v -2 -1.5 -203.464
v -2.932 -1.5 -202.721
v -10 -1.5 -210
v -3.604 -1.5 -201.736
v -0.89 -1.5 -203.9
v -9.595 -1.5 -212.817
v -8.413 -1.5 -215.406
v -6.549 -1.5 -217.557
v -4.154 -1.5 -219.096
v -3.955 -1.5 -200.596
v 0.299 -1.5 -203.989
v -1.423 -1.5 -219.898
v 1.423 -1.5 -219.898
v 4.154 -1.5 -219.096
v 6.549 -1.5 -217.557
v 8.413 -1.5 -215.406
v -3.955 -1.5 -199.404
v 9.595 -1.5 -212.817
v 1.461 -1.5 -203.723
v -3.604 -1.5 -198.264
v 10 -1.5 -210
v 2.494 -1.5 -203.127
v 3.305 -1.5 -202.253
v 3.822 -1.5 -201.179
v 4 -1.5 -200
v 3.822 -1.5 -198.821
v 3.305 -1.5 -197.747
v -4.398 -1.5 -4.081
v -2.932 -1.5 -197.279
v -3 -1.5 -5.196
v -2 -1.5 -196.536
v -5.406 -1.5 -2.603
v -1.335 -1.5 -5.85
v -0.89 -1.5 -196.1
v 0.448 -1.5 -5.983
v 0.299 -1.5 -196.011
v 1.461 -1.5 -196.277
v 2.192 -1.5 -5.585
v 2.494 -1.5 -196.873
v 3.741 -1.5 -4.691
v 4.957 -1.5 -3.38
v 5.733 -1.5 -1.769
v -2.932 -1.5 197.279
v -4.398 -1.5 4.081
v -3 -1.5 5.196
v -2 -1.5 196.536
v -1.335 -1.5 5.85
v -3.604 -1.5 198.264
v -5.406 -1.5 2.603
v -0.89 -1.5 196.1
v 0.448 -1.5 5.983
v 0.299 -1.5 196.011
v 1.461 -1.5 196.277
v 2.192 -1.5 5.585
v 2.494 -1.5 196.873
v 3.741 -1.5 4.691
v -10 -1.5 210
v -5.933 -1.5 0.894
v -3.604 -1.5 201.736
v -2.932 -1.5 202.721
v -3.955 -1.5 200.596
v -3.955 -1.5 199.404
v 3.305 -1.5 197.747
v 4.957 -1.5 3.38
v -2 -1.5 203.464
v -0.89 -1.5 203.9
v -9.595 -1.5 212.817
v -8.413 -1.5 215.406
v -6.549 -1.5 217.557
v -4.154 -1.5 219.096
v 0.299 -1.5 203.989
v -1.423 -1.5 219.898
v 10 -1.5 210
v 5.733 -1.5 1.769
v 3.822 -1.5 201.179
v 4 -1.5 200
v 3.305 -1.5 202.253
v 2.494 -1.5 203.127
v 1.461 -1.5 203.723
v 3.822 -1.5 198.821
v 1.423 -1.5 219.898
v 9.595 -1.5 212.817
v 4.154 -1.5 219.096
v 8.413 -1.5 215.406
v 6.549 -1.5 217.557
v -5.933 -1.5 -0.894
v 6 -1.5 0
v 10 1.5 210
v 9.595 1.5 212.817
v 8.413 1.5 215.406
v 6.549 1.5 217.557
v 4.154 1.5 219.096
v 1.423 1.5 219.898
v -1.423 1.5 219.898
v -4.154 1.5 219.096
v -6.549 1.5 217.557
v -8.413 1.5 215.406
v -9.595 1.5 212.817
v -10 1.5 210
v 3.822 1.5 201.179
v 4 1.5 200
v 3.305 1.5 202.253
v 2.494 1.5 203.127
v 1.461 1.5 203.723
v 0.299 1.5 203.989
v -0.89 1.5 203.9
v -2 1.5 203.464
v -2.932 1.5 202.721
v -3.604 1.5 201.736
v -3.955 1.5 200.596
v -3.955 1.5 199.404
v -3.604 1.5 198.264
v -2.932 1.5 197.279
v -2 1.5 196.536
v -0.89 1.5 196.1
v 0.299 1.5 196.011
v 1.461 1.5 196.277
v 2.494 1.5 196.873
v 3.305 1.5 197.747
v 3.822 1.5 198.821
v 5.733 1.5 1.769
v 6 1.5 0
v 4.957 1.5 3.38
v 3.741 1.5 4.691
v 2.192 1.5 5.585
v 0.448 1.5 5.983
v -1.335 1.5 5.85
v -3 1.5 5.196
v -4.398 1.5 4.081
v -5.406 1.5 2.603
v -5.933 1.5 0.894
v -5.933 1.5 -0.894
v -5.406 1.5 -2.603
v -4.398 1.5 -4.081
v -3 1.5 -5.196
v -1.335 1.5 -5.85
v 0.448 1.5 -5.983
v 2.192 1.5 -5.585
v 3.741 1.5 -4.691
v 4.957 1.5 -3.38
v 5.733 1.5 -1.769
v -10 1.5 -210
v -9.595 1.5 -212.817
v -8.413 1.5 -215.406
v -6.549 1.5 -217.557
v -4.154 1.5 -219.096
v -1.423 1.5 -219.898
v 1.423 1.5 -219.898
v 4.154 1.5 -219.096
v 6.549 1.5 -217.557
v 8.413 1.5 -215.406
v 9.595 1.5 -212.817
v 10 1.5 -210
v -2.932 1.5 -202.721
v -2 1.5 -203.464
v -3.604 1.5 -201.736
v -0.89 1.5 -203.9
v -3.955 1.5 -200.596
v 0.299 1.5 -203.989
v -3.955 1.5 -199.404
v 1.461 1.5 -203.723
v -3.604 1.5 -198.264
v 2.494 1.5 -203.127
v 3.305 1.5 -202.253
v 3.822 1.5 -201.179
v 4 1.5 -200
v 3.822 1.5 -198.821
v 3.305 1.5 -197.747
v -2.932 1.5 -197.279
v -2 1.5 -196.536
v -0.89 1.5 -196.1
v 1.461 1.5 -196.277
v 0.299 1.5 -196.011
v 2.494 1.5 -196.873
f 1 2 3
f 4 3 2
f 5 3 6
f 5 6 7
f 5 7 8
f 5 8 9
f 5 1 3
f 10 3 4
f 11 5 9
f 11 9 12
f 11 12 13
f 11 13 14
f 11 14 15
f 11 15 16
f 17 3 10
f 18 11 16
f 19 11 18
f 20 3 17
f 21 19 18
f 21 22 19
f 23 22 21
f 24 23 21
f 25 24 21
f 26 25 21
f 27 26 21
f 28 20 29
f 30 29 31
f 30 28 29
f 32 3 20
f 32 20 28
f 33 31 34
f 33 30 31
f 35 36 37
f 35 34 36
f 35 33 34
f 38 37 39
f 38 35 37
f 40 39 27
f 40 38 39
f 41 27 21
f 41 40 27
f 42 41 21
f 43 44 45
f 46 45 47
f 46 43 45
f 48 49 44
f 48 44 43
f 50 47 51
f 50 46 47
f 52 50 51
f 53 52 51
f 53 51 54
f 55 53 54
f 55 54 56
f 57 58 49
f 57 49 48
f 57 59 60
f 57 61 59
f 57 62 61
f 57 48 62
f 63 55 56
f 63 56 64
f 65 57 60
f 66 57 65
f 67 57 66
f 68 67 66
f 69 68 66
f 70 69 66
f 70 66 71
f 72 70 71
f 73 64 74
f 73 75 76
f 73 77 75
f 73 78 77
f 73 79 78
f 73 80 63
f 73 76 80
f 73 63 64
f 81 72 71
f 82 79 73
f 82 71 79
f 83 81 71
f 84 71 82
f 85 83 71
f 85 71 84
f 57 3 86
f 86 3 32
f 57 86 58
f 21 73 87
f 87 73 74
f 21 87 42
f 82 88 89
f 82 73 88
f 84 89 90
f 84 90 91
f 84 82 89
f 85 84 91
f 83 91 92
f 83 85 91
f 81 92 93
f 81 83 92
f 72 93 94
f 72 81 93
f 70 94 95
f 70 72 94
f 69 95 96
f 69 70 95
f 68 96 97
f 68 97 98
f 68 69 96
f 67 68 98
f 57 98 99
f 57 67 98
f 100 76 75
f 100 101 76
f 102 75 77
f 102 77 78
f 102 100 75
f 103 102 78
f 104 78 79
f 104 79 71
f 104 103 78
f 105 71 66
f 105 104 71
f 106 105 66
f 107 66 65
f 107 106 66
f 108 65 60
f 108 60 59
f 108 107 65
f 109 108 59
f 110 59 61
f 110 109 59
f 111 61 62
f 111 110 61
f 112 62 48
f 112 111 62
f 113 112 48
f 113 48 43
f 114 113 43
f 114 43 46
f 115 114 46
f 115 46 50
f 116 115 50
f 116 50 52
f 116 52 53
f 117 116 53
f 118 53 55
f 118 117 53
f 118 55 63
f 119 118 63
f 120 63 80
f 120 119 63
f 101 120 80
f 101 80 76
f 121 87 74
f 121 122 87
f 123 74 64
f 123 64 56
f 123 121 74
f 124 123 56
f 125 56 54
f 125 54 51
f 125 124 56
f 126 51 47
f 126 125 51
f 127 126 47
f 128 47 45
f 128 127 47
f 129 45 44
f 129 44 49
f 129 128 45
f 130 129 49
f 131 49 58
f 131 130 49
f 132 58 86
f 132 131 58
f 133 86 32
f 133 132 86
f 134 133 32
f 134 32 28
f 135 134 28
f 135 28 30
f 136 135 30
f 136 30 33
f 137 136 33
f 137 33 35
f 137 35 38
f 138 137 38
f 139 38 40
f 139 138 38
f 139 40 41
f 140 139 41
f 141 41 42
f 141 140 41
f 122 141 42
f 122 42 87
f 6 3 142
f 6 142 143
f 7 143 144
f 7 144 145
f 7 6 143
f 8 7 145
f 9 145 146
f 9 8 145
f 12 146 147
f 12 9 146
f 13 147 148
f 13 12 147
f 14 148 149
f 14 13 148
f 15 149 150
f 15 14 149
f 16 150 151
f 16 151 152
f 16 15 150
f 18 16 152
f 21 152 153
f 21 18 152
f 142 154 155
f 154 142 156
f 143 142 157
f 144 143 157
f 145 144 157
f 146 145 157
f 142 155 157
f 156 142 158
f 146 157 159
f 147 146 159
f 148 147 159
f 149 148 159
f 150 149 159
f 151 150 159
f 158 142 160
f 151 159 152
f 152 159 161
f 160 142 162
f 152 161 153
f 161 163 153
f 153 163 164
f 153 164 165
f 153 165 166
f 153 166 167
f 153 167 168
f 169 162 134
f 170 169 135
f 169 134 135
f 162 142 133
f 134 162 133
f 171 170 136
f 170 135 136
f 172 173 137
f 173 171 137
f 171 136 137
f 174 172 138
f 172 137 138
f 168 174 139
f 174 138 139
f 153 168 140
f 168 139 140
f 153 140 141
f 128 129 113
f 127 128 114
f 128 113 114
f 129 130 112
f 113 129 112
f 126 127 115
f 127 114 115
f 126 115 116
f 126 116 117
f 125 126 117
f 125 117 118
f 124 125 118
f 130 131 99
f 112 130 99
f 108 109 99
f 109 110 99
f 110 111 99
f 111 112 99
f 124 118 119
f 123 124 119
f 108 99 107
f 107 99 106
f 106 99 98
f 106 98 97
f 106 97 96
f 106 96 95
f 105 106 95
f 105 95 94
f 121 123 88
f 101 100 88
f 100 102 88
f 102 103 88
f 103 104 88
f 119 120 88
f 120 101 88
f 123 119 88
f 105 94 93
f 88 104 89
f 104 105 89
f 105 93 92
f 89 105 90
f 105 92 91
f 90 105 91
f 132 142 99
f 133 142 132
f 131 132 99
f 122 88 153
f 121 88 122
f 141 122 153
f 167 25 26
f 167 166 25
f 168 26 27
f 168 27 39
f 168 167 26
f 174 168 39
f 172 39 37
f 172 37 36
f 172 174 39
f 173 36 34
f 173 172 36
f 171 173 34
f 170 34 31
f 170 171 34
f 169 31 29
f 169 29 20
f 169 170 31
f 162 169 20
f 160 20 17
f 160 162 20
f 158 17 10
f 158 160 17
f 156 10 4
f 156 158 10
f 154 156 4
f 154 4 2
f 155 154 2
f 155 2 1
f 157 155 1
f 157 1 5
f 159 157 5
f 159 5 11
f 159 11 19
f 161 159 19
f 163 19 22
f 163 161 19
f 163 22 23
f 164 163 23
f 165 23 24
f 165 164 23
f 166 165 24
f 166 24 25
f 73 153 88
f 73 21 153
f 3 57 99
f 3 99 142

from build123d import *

# Parameters (mm, degrees)
F0_R     = 4
F0_R_2   = 6
F1_DEPTH = 1.5


with BuildPart() as f1:
    # F0 (on Front) → F1 (new body, symmetric)
    with BuildSketch(Plane.XZ):
        with BuildLine():
            ThreePointArc((10, 210), (0, 220), (-10, 210))
            Line((-10, 210), (-10, -210))
            ThreePointArc((-10, -210), (0, -220), (10, -210))
            Line((10, -210), (10, 210))
        make_face()
        with Locations((0, -200)):
            Circle(F0_R, mode=Mode.SUBTRACT)
        Circle(F0_R_2, mode=Mode.SUBTRACT)
        with Locations((0, 200)):
            Circle(F0_R, mode=Mode.SUBTRACT)
    extrude(amount=F1_DEPTH, both=True)


solid = f1.part
